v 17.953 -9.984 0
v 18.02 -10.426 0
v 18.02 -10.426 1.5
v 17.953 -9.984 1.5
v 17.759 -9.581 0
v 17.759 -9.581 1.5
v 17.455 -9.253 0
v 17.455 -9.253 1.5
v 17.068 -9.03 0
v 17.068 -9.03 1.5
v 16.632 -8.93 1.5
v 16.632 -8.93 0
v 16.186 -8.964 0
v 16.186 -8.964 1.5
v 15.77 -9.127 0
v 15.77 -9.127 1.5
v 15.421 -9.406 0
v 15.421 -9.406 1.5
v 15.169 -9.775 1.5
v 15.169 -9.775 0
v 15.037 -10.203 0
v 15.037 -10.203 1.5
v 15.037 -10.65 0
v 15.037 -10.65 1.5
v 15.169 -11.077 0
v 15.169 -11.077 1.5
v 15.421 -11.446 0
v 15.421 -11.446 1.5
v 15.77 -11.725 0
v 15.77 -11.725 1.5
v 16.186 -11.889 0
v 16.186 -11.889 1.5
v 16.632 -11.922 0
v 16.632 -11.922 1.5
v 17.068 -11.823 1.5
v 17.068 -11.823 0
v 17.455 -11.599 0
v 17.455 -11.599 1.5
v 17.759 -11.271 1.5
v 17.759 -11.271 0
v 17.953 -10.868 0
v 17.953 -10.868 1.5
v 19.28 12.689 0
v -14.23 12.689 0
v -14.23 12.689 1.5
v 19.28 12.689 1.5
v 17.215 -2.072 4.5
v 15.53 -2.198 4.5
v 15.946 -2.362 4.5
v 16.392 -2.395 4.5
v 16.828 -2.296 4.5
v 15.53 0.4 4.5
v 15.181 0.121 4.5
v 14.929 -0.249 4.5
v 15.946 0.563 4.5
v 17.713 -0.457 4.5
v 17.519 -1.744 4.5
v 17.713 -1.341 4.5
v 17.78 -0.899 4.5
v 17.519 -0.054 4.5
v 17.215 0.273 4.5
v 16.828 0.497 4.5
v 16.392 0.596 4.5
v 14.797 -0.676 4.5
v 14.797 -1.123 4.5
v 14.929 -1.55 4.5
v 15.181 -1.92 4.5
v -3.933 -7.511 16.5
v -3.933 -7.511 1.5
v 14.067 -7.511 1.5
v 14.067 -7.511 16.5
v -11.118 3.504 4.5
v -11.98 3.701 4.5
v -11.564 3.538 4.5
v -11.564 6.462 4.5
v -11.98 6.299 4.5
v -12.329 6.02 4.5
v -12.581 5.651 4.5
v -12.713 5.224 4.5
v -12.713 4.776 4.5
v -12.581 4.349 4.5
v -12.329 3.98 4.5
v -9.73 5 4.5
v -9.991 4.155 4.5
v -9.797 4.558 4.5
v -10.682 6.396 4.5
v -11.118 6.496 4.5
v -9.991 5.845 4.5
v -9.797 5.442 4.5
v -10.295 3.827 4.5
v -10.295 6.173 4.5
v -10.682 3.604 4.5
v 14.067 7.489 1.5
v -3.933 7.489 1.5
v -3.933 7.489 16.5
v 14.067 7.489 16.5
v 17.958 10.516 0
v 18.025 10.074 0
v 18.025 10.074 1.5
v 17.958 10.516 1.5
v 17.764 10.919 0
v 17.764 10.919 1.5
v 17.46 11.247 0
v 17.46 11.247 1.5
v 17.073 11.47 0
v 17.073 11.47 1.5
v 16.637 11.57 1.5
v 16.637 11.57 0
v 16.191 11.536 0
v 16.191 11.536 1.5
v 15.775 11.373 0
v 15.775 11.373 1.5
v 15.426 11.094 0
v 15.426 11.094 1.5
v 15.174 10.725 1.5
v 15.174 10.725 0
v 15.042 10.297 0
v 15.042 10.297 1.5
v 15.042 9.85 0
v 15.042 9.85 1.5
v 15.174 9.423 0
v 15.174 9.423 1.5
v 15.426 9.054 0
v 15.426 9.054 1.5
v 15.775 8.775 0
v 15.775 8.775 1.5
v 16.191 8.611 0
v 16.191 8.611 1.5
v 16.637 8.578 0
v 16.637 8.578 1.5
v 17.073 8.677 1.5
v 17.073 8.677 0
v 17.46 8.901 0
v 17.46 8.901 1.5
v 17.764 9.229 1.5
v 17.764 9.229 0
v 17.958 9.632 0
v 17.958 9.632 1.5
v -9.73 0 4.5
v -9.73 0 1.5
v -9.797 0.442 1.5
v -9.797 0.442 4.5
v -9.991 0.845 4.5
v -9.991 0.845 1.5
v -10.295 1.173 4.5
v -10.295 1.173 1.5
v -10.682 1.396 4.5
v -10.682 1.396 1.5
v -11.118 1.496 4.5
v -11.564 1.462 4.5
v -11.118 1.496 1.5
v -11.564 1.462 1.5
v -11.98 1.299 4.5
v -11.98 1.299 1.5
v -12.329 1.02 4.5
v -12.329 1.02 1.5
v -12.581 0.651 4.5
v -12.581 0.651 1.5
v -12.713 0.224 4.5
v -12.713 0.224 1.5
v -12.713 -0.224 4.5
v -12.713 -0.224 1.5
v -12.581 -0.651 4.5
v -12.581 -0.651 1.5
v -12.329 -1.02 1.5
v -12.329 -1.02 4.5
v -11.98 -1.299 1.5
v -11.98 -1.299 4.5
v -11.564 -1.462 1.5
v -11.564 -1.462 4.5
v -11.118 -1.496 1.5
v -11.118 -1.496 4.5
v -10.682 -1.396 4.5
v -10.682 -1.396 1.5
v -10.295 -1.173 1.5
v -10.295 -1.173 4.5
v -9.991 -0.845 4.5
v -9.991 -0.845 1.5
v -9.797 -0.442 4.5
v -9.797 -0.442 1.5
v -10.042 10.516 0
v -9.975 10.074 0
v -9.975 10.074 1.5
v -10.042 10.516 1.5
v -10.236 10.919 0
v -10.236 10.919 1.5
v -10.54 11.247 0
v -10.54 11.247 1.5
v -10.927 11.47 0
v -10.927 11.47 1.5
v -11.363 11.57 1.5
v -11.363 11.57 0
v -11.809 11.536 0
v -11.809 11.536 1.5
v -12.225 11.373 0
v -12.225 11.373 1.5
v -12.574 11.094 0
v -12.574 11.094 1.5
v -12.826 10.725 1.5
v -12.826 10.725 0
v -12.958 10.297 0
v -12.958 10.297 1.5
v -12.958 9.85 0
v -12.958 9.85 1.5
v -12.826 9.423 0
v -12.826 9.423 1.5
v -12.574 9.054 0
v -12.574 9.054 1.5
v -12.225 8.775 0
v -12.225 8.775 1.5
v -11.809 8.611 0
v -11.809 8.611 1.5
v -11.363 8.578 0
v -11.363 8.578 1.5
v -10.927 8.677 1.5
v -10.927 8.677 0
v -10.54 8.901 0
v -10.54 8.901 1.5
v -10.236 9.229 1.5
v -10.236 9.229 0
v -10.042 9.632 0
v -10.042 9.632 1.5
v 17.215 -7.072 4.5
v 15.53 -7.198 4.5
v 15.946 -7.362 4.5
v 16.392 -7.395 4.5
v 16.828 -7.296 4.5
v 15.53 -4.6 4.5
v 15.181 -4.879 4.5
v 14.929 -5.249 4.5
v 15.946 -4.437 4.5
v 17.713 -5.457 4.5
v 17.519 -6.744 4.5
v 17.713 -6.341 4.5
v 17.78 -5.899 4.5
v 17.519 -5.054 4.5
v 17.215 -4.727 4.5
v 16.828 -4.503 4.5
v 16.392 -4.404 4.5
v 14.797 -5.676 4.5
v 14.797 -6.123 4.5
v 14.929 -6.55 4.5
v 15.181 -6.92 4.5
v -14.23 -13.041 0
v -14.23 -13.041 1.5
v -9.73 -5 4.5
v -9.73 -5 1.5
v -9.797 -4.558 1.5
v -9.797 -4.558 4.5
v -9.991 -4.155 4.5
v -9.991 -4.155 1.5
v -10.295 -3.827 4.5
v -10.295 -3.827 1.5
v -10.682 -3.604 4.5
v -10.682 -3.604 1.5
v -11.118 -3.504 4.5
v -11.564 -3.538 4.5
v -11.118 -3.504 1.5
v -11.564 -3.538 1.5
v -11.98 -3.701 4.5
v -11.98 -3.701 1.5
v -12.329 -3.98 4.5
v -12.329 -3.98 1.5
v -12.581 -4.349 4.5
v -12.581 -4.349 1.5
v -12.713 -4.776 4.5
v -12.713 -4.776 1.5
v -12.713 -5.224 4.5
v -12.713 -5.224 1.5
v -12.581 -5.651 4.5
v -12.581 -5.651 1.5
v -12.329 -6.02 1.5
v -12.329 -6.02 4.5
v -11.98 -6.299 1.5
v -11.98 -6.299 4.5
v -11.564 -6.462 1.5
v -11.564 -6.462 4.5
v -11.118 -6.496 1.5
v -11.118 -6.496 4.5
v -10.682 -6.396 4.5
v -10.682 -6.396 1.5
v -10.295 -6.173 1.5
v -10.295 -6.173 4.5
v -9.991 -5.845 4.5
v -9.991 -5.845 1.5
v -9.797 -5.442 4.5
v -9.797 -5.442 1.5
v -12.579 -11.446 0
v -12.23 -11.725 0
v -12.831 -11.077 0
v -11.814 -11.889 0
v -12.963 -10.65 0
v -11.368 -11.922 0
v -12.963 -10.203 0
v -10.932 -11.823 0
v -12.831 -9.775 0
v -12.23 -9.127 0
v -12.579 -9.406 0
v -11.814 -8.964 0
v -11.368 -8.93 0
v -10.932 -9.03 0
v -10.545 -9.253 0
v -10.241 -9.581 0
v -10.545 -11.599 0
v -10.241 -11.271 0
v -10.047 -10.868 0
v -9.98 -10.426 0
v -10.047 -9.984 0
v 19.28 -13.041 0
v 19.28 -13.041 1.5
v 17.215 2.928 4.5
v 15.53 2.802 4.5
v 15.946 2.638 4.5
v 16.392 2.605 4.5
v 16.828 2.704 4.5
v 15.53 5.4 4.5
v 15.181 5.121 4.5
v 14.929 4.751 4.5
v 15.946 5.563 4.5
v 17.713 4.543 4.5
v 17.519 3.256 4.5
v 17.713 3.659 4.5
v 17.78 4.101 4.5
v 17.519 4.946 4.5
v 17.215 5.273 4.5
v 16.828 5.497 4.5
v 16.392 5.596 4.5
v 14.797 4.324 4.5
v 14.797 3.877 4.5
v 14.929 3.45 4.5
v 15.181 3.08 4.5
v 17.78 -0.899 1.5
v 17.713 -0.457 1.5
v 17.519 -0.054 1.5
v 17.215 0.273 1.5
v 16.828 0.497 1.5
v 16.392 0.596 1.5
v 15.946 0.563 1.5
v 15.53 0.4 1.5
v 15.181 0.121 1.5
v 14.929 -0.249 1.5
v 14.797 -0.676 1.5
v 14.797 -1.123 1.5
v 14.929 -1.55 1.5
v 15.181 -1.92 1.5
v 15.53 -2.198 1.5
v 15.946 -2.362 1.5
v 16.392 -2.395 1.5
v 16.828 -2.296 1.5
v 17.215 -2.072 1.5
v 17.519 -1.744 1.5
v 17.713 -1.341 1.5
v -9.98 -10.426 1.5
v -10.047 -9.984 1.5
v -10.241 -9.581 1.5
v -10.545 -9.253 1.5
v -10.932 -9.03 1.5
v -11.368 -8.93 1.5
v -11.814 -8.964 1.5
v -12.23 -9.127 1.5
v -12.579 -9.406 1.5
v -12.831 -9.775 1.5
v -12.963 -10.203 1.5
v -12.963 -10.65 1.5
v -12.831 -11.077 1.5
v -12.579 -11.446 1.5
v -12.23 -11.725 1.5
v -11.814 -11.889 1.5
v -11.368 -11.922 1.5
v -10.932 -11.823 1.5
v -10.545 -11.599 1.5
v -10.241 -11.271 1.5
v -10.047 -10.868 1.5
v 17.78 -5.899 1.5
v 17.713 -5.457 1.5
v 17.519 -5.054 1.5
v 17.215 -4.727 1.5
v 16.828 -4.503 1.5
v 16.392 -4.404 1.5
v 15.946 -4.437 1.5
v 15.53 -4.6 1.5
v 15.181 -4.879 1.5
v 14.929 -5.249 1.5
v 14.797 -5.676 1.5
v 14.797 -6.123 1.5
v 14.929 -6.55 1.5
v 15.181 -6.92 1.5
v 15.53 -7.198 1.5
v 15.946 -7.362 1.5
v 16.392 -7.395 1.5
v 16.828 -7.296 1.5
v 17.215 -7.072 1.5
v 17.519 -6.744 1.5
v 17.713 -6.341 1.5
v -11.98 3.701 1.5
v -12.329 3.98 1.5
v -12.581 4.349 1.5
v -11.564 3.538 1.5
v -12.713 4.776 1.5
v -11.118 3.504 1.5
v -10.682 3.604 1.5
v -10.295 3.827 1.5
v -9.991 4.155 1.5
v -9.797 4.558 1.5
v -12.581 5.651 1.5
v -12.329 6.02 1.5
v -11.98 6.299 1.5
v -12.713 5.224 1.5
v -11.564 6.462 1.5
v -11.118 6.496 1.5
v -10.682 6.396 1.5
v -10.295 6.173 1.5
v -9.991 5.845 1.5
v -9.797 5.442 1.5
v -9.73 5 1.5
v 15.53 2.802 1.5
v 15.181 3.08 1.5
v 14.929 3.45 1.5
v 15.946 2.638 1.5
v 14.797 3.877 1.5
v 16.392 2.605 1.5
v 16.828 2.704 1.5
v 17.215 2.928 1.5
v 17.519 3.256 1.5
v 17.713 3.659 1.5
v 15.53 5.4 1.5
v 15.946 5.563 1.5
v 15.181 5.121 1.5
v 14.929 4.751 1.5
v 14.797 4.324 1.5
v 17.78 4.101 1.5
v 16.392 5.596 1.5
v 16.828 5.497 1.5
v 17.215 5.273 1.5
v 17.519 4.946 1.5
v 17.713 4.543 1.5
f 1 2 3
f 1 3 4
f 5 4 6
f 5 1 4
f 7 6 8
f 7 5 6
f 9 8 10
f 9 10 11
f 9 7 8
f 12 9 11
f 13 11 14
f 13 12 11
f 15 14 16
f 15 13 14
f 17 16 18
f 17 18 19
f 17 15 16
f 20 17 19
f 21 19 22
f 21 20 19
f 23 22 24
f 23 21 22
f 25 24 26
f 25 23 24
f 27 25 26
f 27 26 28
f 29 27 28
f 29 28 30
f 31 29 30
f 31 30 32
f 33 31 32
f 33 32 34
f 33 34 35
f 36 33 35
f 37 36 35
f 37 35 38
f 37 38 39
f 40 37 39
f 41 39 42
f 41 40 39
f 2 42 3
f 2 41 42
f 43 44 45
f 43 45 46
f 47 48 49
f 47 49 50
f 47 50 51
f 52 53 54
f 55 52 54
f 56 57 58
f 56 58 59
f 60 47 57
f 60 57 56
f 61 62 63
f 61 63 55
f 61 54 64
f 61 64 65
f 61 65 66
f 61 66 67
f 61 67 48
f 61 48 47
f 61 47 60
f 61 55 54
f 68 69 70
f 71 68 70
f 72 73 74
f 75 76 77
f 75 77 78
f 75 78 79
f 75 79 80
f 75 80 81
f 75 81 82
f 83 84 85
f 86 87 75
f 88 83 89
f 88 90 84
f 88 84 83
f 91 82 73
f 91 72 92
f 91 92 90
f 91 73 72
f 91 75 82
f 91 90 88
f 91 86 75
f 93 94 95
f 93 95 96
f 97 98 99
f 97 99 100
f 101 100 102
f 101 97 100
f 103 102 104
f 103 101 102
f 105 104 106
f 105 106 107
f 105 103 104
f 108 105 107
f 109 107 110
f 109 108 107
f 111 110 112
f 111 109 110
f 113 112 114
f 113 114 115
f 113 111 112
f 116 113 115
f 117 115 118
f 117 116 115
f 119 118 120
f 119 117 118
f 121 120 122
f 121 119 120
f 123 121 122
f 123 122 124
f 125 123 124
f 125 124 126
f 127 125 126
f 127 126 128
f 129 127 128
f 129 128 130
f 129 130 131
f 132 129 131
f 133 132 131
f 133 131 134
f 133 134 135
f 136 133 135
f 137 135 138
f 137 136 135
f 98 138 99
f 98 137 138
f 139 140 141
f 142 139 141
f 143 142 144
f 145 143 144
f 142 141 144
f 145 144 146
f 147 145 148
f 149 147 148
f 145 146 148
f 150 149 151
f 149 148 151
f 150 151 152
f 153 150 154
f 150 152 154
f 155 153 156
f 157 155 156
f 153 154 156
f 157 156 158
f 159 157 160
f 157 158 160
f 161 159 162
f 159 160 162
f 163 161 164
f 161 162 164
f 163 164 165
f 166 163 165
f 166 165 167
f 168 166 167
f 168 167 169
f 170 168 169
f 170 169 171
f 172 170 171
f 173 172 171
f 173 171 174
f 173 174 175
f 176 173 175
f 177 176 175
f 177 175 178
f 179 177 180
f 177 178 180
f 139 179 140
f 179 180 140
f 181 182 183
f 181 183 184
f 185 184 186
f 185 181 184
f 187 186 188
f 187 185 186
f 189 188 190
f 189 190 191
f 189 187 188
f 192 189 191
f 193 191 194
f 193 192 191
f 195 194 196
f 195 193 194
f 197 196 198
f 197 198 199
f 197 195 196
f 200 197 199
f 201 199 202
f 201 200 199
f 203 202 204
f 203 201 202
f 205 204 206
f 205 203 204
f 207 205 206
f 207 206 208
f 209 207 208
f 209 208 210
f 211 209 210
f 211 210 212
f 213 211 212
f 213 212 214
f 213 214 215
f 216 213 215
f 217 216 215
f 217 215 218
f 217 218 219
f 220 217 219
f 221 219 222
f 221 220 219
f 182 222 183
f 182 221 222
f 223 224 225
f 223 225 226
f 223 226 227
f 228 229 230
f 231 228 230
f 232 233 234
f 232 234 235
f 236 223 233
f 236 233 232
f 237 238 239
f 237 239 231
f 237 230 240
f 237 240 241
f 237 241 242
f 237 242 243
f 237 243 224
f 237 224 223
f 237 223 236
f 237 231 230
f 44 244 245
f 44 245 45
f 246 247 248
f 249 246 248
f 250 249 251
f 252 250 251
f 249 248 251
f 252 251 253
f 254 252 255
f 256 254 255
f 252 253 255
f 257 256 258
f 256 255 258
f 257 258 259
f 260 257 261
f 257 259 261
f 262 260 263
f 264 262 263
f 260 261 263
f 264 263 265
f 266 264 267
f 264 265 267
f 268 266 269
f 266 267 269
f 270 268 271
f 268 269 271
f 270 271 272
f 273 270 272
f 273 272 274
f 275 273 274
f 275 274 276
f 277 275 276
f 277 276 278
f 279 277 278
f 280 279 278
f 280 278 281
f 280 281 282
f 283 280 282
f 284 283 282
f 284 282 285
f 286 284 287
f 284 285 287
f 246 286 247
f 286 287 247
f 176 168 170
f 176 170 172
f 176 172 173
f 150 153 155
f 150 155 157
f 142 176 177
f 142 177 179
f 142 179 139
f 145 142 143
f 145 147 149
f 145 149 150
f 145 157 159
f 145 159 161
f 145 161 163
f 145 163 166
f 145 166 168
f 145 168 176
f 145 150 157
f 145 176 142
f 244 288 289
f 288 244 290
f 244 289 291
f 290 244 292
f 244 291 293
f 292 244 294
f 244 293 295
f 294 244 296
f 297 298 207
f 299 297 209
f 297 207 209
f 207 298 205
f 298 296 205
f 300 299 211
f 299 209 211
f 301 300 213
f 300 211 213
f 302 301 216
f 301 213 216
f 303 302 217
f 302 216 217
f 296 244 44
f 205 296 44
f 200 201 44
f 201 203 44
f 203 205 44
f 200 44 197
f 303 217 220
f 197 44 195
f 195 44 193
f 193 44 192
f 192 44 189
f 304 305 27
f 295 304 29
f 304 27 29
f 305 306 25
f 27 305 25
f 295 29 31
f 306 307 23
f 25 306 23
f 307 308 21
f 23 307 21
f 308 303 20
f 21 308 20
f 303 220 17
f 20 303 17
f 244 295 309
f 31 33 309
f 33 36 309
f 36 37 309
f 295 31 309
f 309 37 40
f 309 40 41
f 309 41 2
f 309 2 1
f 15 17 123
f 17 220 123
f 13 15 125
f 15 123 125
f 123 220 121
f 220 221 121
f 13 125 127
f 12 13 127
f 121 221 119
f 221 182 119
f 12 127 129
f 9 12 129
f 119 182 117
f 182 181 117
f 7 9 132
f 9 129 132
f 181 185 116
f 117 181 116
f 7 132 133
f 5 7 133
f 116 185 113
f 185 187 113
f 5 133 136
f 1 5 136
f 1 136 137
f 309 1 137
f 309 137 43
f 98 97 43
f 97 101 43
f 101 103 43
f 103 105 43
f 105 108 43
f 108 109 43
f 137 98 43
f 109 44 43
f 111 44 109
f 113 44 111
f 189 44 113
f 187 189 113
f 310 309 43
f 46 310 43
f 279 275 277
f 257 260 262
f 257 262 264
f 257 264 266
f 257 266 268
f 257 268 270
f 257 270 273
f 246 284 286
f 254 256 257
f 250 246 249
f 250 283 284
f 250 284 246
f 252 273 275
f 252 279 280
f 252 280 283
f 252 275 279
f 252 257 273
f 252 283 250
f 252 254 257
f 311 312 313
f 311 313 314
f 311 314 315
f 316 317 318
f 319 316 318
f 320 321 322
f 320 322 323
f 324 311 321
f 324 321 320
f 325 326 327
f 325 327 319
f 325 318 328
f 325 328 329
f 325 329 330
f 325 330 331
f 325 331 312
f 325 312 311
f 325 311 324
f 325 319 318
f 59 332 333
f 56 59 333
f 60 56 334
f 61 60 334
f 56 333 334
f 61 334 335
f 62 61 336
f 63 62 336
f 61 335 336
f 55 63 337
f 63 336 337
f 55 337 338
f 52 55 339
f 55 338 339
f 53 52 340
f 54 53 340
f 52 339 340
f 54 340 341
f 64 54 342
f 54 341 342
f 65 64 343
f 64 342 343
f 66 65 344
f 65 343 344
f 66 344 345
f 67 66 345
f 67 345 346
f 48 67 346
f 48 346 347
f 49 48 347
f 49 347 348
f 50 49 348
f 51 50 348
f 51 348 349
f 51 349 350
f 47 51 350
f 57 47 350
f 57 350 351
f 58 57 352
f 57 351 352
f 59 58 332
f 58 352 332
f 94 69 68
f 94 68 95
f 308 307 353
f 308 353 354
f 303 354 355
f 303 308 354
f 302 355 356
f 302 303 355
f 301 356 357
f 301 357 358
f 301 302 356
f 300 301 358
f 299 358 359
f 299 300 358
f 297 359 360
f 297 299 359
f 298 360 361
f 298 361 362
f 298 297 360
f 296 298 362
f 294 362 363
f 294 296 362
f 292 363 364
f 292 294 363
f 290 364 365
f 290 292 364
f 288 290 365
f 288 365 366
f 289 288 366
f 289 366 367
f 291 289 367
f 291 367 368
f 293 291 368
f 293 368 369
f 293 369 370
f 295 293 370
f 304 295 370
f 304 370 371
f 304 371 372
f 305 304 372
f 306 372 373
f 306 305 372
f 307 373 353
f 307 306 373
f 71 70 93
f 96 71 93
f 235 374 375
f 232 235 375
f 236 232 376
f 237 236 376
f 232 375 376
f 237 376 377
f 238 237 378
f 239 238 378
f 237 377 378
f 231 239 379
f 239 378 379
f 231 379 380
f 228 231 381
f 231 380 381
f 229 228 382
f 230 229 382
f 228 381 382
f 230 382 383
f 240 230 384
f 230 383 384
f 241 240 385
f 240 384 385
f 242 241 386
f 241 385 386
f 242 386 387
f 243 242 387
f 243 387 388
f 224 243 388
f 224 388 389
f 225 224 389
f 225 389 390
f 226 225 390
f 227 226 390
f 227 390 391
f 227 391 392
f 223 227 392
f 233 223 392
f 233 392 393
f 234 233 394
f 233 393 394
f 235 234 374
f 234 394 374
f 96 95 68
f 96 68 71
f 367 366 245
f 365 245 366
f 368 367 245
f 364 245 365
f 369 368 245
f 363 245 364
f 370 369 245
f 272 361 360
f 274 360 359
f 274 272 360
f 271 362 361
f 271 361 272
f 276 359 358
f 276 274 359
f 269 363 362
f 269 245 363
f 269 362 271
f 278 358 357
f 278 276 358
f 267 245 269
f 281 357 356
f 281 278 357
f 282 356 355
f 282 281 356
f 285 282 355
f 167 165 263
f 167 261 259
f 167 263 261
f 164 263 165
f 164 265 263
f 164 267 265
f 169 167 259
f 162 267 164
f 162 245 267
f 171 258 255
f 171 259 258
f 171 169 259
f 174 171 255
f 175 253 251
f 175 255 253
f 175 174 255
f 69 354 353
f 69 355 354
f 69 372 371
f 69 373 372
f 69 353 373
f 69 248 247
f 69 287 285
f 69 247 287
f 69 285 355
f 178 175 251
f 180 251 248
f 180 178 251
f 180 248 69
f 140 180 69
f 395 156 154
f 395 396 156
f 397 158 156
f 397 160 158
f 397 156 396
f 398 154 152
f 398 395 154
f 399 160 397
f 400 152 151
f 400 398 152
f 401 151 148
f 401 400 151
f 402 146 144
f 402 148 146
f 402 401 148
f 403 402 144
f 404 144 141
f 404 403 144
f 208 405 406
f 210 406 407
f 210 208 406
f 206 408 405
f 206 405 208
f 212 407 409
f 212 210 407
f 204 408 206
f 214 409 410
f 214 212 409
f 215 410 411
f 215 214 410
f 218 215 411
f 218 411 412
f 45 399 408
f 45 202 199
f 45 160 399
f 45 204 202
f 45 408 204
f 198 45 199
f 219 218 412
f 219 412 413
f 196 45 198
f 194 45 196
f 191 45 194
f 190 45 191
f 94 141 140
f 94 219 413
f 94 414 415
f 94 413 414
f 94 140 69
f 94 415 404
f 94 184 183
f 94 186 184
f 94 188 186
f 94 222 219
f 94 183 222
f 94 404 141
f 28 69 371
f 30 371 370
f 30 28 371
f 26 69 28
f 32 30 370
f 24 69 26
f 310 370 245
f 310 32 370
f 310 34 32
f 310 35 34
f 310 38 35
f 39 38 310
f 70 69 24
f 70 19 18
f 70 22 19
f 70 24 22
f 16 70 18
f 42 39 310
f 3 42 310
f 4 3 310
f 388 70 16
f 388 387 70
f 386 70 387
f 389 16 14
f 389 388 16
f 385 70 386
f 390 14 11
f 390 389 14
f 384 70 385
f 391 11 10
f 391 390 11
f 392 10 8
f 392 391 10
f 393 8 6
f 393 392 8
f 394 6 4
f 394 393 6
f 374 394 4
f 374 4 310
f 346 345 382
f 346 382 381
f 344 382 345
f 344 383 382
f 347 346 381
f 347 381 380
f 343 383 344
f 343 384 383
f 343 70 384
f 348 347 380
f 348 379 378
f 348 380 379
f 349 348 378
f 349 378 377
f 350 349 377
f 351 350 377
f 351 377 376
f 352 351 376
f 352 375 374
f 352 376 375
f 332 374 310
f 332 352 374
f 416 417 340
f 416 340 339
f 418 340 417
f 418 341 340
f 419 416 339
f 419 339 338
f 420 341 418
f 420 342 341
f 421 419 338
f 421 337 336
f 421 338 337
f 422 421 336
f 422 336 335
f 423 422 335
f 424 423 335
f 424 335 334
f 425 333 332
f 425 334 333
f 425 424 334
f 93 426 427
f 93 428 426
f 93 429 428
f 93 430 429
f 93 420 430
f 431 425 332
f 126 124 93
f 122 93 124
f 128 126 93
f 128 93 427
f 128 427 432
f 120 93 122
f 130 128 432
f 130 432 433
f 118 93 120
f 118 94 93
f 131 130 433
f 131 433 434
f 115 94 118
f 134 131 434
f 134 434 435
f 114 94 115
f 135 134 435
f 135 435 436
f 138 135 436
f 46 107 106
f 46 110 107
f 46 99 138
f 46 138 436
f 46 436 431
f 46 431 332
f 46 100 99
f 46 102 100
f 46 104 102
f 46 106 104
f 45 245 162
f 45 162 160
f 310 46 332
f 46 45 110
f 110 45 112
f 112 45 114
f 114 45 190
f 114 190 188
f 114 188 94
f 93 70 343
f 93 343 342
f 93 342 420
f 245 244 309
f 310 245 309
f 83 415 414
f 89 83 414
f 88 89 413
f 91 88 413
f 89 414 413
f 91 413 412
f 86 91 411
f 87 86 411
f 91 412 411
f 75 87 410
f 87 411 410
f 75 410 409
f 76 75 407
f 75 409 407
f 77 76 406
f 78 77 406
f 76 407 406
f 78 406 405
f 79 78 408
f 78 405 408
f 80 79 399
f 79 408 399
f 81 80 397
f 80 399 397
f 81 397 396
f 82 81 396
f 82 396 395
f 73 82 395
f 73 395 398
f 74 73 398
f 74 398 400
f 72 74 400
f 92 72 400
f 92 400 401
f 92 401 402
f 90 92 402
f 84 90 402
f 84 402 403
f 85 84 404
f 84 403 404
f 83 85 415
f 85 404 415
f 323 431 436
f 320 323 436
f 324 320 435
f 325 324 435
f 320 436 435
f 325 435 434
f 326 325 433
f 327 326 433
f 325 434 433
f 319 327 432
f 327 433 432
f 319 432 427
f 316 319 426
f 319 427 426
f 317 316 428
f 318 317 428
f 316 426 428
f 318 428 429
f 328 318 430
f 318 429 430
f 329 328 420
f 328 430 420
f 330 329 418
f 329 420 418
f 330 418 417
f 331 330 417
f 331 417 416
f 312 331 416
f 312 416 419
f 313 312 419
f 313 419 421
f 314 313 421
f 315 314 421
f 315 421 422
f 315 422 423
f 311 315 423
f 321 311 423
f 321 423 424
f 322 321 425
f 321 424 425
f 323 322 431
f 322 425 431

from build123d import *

# Parameters (mm, degrees)
SKETCH_1_W      = 33.51
SKETCH_1_H      = 25.73
SKETCH_1_R      = 1.5
EXTRUDE_1_DEPTH = 1.5
SKETCH_2_W      = 18
SKETCH_2_H      = 15
EXTRUDE_2_DEPTH = 15
SKETCH_3_R      = 1.5
EXTRUDE_3_DEPTH = 3


with BuildPart() as part:
    # 草圖1 → 填料-伸長1 (new body)
    with BuildSketch(Plane.XY):
        with Locations((2.525137649, -0.176232877)):
            Rectangle(SKETCH_1_W, SKETCH_1_H)
        with Locations((-11.474862351, 10.073766514)):
            Circle(SKETCH_1_R, mode=Mode.SUBTRACT)
        with Locations((-11.479862351, -10.426232877)):
            Circle(SKETCH_1_R, mode=Mode.SUBTRACT)
        with Locations((16.520137649, -10.426232877)):
            Circle(SKETCH_1_R, mode=Mode.SUBTRACT)
        with Locations((16.525137649, 10.073766514)):
            Circle(SKETCH_1_R, mode=Mode.SUBTRACT)
    extrude(amount=EXTRUDE_1_DEPTH)

    # 草圖2 → 填料-伸長2 (add)
    with BuildSketch(Plane.XY.offset(1.5)):
        with Locations((5.066714054, -0.011232877)):
            Rectangle(SKETCH_2_W, SKETCH_2_H)
    extrude(amount=EXTRUDE_2_DEPTH)

    # 草圖3 → 填料-伸長3 (add)
    with BuildSketch(Plane.XY.offset(1.5)):
        with Locations((-11.229862351, 5)):
            Circle(SKETCH_3_R)
        with Locations((-11.229862351, 0)):
            Circle(SKETCH_3_R)
        with Locations((-11.229862351, -5)):
            Circle(SKETCH_3_R)
        with Locations((16.280137649, 4.100671386)):
            Circle(SKETCH_3_R)
        with Locations((16.280137649, -0.899328614)):
            Circle(SKETCH_3_R)
        with Locations((16.280137649, -5.899328614)):
            Circle(SKETCH_3_R)
    extrude(amount=EXTRUDE_3_DEPTH)


solid = part.part
